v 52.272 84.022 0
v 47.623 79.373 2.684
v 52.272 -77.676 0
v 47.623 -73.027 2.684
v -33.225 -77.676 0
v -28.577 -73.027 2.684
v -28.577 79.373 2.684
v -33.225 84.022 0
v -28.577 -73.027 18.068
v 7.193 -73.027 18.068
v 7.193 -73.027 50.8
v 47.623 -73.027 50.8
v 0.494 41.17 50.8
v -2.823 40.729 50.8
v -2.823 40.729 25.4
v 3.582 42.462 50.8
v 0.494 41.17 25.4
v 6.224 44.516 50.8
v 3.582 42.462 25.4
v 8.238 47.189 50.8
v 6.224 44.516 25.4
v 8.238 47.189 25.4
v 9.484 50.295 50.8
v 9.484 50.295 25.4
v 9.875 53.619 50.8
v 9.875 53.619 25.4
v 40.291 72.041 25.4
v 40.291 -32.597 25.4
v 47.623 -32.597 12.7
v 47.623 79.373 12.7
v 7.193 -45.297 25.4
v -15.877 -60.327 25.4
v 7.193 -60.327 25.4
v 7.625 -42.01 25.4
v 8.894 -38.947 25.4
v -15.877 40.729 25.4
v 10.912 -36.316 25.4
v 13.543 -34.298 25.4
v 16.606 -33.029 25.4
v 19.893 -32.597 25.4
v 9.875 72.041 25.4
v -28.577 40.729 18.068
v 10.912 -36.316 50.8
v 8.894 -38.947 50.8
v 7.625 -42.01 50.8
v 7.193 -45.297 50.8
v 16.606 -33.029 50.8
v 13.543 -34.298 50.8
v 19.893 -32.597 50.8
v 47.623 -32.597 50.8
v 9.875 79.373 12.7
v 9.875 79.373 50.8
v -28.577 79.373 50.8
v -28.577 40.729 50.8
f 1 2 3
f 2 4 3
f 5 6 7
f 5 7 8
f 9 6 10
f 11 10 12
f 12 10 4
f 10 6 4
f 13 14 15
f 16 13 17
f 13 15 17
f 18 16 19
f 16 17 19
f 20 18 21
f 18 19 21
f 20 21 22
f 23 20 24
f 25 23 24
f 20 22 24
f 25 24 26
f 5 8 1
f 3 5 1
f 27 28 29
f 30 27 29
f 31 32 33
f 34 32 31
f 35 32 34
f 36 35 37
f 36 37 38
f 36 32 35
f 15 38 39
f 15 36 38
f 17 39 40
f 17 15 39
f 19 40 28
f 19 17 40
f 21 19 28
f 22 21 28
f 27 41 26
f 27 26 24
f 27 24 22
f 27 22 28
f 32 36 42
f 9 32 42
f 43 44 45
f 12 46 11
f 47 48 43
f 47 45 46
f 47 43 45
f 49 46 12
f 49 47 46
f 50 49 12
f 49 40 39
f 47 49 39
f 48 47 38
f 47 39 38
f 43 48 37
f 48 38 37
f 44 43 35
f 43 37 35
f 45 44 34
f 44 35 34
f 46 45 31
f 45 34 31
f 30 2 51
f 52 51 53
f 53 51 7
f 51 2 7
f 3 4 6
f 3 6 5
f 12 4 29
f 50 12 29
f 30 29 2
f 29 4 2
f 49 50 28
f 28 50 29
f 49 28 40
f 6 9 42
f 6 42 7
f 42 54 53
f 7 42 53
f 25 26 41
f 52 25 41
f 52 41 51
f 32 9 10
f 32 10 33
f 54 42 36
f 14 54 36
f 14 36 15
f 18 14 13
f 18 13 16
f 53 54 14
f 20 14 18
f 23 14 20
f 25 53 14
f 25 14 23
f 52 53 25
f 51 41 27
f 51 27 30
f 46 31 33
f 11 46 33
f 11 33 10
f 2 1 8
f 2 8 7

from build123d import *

# Parameters (mm, degrees)
F0_W          = 88.9
F0_H          = 165.1
F1_DEPTH      = 6.35
F2_DEPTH      = 25.4
F3_DEPTH      = 25.4
F4_T1_DEPTH   = 141.911978168
F4_T3_DEPTH   = 218.111978168
F4_T8_DEPTH   = 154.611978168
F4_T14_DEPTH  = 154.611978168
F4_T20_DEPTH  = 154.611978168
F4_T27_DEPTH  = 154.611978168
F4_T33_DEPTH  = 154.611978168
F4_T39_DEPTH  = 230.811978168
F4_T45_DEPTH  = 230.811978168
F4_T51_DEPTH  = 230.811978168
F4_T58_DEPTH  = 230.811978168
F4_T64_DEPTH  = 230.811978168
F4_T70_DEPTH  = 230.811978168
F4_T76_DEPTH  = 230.811978168
F4_T82_DEPTH  = 230.811978168
F4_T89_DEPTH  = 230.811978168
F4_T95_DEPTH  = 230.811978168
F4_T101_DEPTH = 154.611978168
F4_T107_DEPTH = 154.611978168
F4_T113_DEPTH = 154.611978168
F4_T120_DEPTH = 154.611978168
F4_T126_DEPTH = 154.611978168
F5_DEPTH      = 50.8


# Not quite as in the source:
# - a fillet or chamfer that OpenCascade refuses, or shapes differently, is made with other operations: its cross-section is extruded or revolved along the edge and cut away or added


with BuildPart() as f1:
    # F0 (on Top) → F1 (new body)
    with BuildSketch(Plane.XY):
        with Locations((9.5230986749, 3.1729897651)):
            Rectangle(F0_W, F0_H)
        Polygon((-28.5769013251, 40.7291018275), (-28.5769013251, 79.3729897651), (9.8754219143, 79.3729897651), (47.6230986749, 79.3729897651), (47.6230986749, -32.5965460718), (47.6230986749, -73.0270102349), (7.1926345117, -73.0270102349), (-28.5769013251, -73.0270102349), align=None, mode=Mode.SUBTRACT)
    extrude(amount=F1_DEPTH)

    # F0 (on Top) → F2 (join)
    with BuildSketch(Plane.XY):
        with BuildLine():
            Line((47.6230986749, 79.3729897651), (9.8754219143, 79.3729897651))
            Line((9.8754219143, 79.3729897651), (9.8754219143, 53.6192430722))
            ThreePointArc((9.8754219143, 53.6192430722), (6.2240768174, 44.5163243089), (-2.8231546322, 40.7291018275))
            Line((-2.8231546322, 40.7291018275), (-28.5769013251, 40.7291018275))
            Line((-28.5769013251, 40.7291018275), (-28.5769013251, -73.0270102349))
            Line((-28.5769013251, -73.0270102349), (7.1926345117, -73.0270102349))
            Line((7.1926345117, -73.0270102349), (7.1926345117, -45.2965460718))
            ThreePointArc((7.1926345117, -45.2965460718), (10.9123783907, -36.3162899507), (19.8926345117, -32.5965460718))
            Line((19.8926345117, -32.5965460718), (47.6230986749, -32.5965460718))
            Line((47.6230986749, -32.5965460718), (47.6230986749, 79.3729897651))
        make_face()
    extrude(amount=F2_DEPTH)

    # F0 (on Top) → F3 (join)
    with BuildSketch(Plane.XY):
        with BuildLine():
            Line((9.8754219143, 79.3729897651), (-28.5769013251, 79.3729897651))
            Line((-28.5769013251, 79.3729897651), (-28.5769013251, 40.7291018275))
            Line((-28.5769013251, 40.7291018275), (-2.8231546322, 40.7291018275))
            ThreePointArc((-2.8231546322, 40.7291018275), (6.2240768174, 44.5163243089), (9.8754219143, 53.6192430722))
            Line((9.8754219143, 53.6192430722), (9.8754219143, 79.3729897651))
        make_face()
        with BuildLine():
            Line((47.6230986749, -73.0270102349), (47.6230986749, -32.5965460718))
            Line((47.6230986749, -32.5965460718), (19.8926345117, -32.5965460718))
            ThreePointArc((19.8926345117, -32.5965460718), (10.9123783907, -36.3162899507), (7.1926345117, -45.2965460718))
            Line((7.1926345117, -45.2965460718), (7.1926345117, -73.0270102349))
            Line((7.1926345117, -73.0270102349), (47.6230986749, -73.0270102349))
        make_face()
    extrude(amount=F3_DEPTH)

    # F4: chamfer of 12.7 x 7.3323484187 on 8 edges, made by hand

    # F4_s2 → F4_t1 (cut)
    with BuildSketch(Plane.YZ.offset(-61.4328904091)):
        Polygon((-73.0270102349, 18.0676515813), (-60.3270102349, 25.4), (-73.0270102349, 25.4), align=None)
        Polygon((72.0406413464, 25.4), (79.3729897651, 12.7), (79.3729897651, 25.4), align=None)
    extrude(amount=F4_T1_DEPTH, mode=Mode.SUBTRACT)

    # F4_s4 → F4_t3 (cut)
    with BuildSketch(Plane.XZ.offset(-112.2289788491)):
        Polygon((-15.8769013251, 25.4), (-28.5769013251, 18.0676515813), (-28.5769013251, 25.4), align=None)
        Polygon((40.2907502562, 25.4), (47.6230986749, 12.7), (47.6230986749, 25.4), align=None)
    extrude(amount=F4_T3_DEPTH, mode=Mode.SUBTRACT)


with BuildPart() as f4_tool6:
    # F4_s7 → F4_t8 (new body)
    with BuildSketch(Plane.YZ.offset(-67.7828904091)):
        Polygon((-66.6770102349, 6.35), (-79.3770102349, -0.9823484187), (-79.3770102349, 6.35), align=None)
    extrude(amount=F4_T8_DEPTH)

    split(bisect_by=Plane.YZ.offset(-28.5769013251), keep=Keep.BOTTOM)

    split(bisect_by=Plane.XZ.offset(73.0270102349), keep=Keep.BOTTOM)


with BuildPart() as f1_1:
    add(f1.part)

    # F4_t5: cut F4_tool6
    add(f4_tool6.part, mode=Mode.SUBTRACT)


with BuildPart() as f4_tool12:
    # F4_s13 → F4_t14 (new body)
    with BuildSketch(Plane.YZ.offset(-67.7828904091)):
        Polygon((-66.6770102349, 6.35), (-79.3770102349, -0.9823484187), (-79.3770102349, 6.35), align=None)
    extrude(amount=F4_T14_DEPTH)

    split(bisect_by=Plane.YZ.offset(-28.5769013251), keep=Keep.BOTTOM)

    split(bisect_by=Plane.XZ.offset(73.0270102349), keep=Keep.TOP)


with BuildPart() as f1_2:
    add(f1_1.part)

    # F4_t11: cut F4_tool12
    add(f4_tool12.part, mode=Mode.SUBTRACT)


with BuildPart() as f4_tool18:
    # F4_s19 → F4_t20 (new body)
    with BuildSketch(Plane.YZ.offset(-67.7828904091)):
        Polygon((-66.6770102349, 6.35), (-79.3770102349, -0.9823484187), (-79.3770102349, 6.35), align=None)
    extrude(amount=F4_T20_DEPTH)

    split(bisect_by=Plane.YZ.offset(-28.5769013251), keep=Keep.TOP)

    split(bisect_by=Plane.YZ.offset(47.6230986749), keep=Keep.BOTTOM)

    split(bisect_by=Plane.XZ.offset(73.0270102349), keep=Keep.TOP)


with BuildPart() as f1_3:
    add(f1_2.part)

    # F4_t17: cut F4_tool18
    add(f4_tool18.part, mode=Mode.SUBTRACT)


with BuildPart() as f4_tool25:
    # F4_s26 → F4_t27 (new body)
    with BuildSketch(Plane.YZ.offset(-67.7828904091)):
        Polygon((-66.6770102349, 6.35), (-79.3770102349, -0.9823484187), (-79.3770102349, 6.35), align=None)
    extrude(amount=F4_T27_DEPTH)

    split(bisect_by=Plane.YZ.offset(47.6230986749), keep=Keep.TOP)

    split(bisect_by=Plane.XZ.offset(73.0270102349), keep=Keep.BOTTOM)


with BuildPart() as f1_4:
    add(f1_3.part)

    # F4_t24: cut F4_tool25
    add(f4_tool25.part, mode=Mode.SUBTRACT)


with BuildPart() as f4_tool31:
    # F4_s32 → F4_t33 (new body)
    with BuildSketch(Plane.YZ.offset(-67.7828904091)):
        Polygon((-66.6770102349, 6.35), (-79.3770102349, -0.9823484187), (-79.3770102349, 6.35), align=None)
    extrude(amount=F4_T33_DEPTH)

    split(bisect_by=Plane.YZ.offset(47.6230986749), keep=Keep.TOP)

    split(bisect_by=Plane.XZ.offset(73.0270102349), keep=Keep.TOP)


with BuildPart() as f1_5:
    add(f1_4.part)

    # F4_t30: cut F4_tool31
    add(f4_tool31.part, mode=Mode.SUBTRACT)


with BuildPart() as f4_tool37:
    # F4_s38 → F4_t39 (new body)
    with BuildSketch(Plane.XZ.offset(112.2329993189)):
        Polygon((41.2730986749, 6.35), (53.9730986749, -0.9823484187), (53.9730986749, 6.35), align=None)
    extrude(amount=-F4_T39_DEPTH)

    split(bisect_by=Plane.YZ.offset(47.6230986749), keep=Keep.BOTTOM)

    split(bisect_by=Plane.XZ.offset(73.0270102349), keep=Keep.TOP)


with BuildPart() as f1_6:
    add(f1_5.part)

    # F4_t36: cut F4_tool37
    add(f4_tool37.part, mode=Mode.SUBTRACT)


with BuildPart() as f4_tool43:
    # F4_s44 → F4_t45 (new body)
    with BuildSketch(Plane.XZ.offset(112.2329993189)):
        Polygon((41.2730986749, 6.35), (53.9730986749, -0.9823484187), (53.9730986749, 6.35), align=None)
    extrude(amount=-F4_T45_DEPTH)

    split(bisect_by=Plane.YZ.offset(47.6230986749), keep=Keep.TOP)

    split(bisect_by=Plane.XZ.offset(73.0270102349), keep=Keep.TOP)


with BuildPart() as f1_7:
    add(f1_6.part)

    # F4_t42: cut F4_tool43
    add(f4_tool43.part, mode=Mode.SUBTRACT)


with BuildPart() as f4_tool49:
    # F4_s50 → F4_t51 (new body)
    with BuildSketch(Plane.XZ.offset(112.2329993189)):
        Polygon((41.2730986749, 6.35), (53.9730986749, -0.9823484187), (53.9730986749, 6.35), align=None)
    extrude(amount=-F4_T51_DEPTH)

    split(bisect_by=Plane.XZ.offset(-79.3729897651), keep=Keep.TOP)

    split(bisect_by=Plane.YZ.offset(47.6230986749), keep=Keep.TOP)

    split(bisect_by=Plane.XZ.offset(73.0270102349), keep=Keep.BOTTOM)


with BuildPart() as f1_8:
    add(f1_7.part)

    # F4_t48: cut F4_tool49
    add(f4_tool49.part, mode=Mode.SUBTRACT)


with BuildPart() as f4_tool56:
    # F4_s57 → F4_t58 (new body)
    with BuildSketch(Plane.XZ.offset(112.2329993189)):
        Polygon((41.2730986749, 6.35), (53.9730986749, -0.9823484187), (53.9730986749, 6.35), align=None)
    extrude(amount=-F4_T58_DEPTH)

    split(bisect_by=Plane.XZ.offset(-79.3729897651), keep=Keep.BOTTOM)

    split(bisect_by=Plane.YZ.offset(47.6230986749), keep=Keep.BOTTOM)


with BuildPart() as f1_9:
    add(f1_8.part)

    # F4_t55: cut F4_tool56
    add(f4_tool56.part, mode=Mode.SUBTRACT)


with BuildPart() as f4_tool62:
    # F4_s63 → F4_t64 (new body)
    with BuildSketch(Plane.XZ.offset(112.2329993189)):
        Polygon((41.2730986749, 6.35), (53.9730986749, -0.9823484187), (53.9730986749, 6.35), align=None)
    extrude(amount=-F4_T64_DEPTH)

    split(bisect_by=Plane.XZ.offset(-79.3729897651), keep=Keep.BOTTOM)

    split(bisect_by=Plane.YZ.offset(47.6230986749), keep=Keep.TOP)


with BuildPart() as f1_10:
    add(f1_9.part)

    # F4_t61: cut F4_tool62
    add(f4_tool62.part, mode=Mode.SUBTRACT)


with BuildPart() as f4_tool68:
    # F4_s69 → F4_t70 (new body)
    with BuildSketch(Plane.XZ.offset(-118.5789788491)):
        Polygon((-22.2269013251, 6.35), (-34.9269013251, -0.9823484187), (-34.9269013251, 6.35), align=None)
    extrude(amount=F4_T70_DEPTH)

    split(bisect_by=Plane.YZ.offset(-28.5769013251), keep=Keep.TOP)

    split(bisect_by=Plane.XZ.offset(-79.3729897651), keep=Keep.BOTTOM)


with BuildPart() as f1_11:
    add(f1_10.part)

    # F4_t67: cut F4_tool68
    add(f4_tool68.part, mode=Mode.SUBTRACT)


with BuildPart() as f4_tool74:
    # F4_s75 → F4_t76 (new body)
    with BuildSketch(Plane.XZ.offset(-118.5789788491)):
        Polygon((-22.2269013251, 6.35), (-34.9269013251, -0.9823484187), (-34.9269013251, 6.35), align=None)
    extrude(amount=F4_T76_DEPTH)

    split(bisect_by=Plane.YZ.offset(-28.5769013251), keep=Keep.BOTTOM)

    split(bisect_by=Plane.XZ.offset(-79.3729897651), keep=Keep.BOTTOM)


with BuildPart() as f1_12:
    add(f1_11.part)

    # F4_t73: cut F4_tool74
    add(f4_tool74.part, mode=Mode.SUBTRACT)


with BuildPart() as f4_tool80:
    # F4_s81 → F4_t82 (new body)
    with BuildSketch(Plane.XZ.offset(-118.5789788491)):
        Polygon((-22.2269013251, 6.35), (-34.9269013251, -0.9823484187), (-34.9269013251, 6.35), align=None)
    extrude(amount=F4_T82_DEPTH)

    split(bisect_by=Plane.YZ.offset(-28.5769013251), keep=Keep.BOTTOM)

    split(bisect_by=Plane.XZ.offset(-79.3729897651), keep=Keep.TOP)

    split(bisect_by=Plane.XZ.offset(73.0270102349), keep=Keep.BOTTOM)


with BuildPart() as f1_13:
    add(f1_12.part)

    # F4_t79: cut F4_tool80
    add(f4_tool80.part, mode=Mode.SUBTRACT)


with BuildPart() as f4_tool87:
    # F4_s88 → F4_t89 (new body)
    with BuildSketch(Plane.XZ.offset(-118.5789788491)):
        Polygon((-22.2269013251, 6.35), (-34.9269013251, -0.9823484187), (-34.9269013251, 6.35), align=None)
    extrude(amount=F4_T89_DEPTH)

    split(bisect_by=Plane.YZ.offset(-28.5769013251), keep=Keep.TOP)

    split(bisect_by=Plane.XZ.offset(73.0270102349), keep=Keep.TOP)


with BuildPart() as f1_14:
    add(f1_13.part)

    # F4_t86: cut F4_tool87
    add(f4_tool87.part, mode=Mode.SUBTRACT)


with BuildPart() as f4_tool93:
    # F4_s94 → F4_t95 (new body)
    with BuildSketch(Plane.XZ.offset(-118.5789788491)):
        Polygon((-22.2269013251, 6.35), (-34.9269013251, -0.9823484187), (-34.9269013251, 6.35), align=None)
    extrude(amount=F4_T95_DEPTH)

    split(bisect_by=Plane.YZ.offset(-28.5769013251), keep=Keep.BOTTOM)

    split(bisect_by=Plane.XZ.offset(73.0270102349), keep=Keep.TOP)


with BuildPart() as f1_15:
    add(f1_14.part)

    # F4_t92: cut F4_tool93
    add(f4_tool93.part, mode=Mode.SUBTRACT)


with BuildPart() as f4_tool99:
    # F4_s100 → F4_t101 (new body)
    with BuildSketch(Plane.YZ.offset(86.8290877589)):
        Polygon((85.7229897651, -0.9823484187), (73.0229897651, 6.35), (85.7229897651, 6.35), align=None)
    extrude(amount=-F4_T101_DEPTH)

    split(bisect_by=Plane.XZ.offset(-79.3729897651), keep=Keep.BOTTOM)

    split(bisect_by=Plane.YZ.offset(47.6230986749), keep=Keep.TOP)


with BuildPart() as f1_16:
    add(f1_15.part)

    # F4_t98: cut F4_tool99
    add(f4_tool99.part, mode=Mode.SUBTRACT)


with BuildPart() as f4_tool105:
    # F4_s106 → F4_t107 (new body)
    with BuildSketch(Plane.YZ.offset(86.8290877589)):
        Polygon((85.7229897651, -0.9823484187), (73.0229897651, 6.35), (85.7229897651, 6.35), align=None)
    extrude(amount=-F4_T107_DEPTH)

    split(bisect_by=Plane.XZ.offset(-79.3729897651), keep=Keep.TOP)

    split(bisect_by=Plane.YZ.offset(47.6230986749), keep=Keep.TOP)


with BuildPart() as f1_17:
    add(f1_16.part)

    # F4_t104: cut F4_tool105
    add(f4_tool105.part, mode=Mode.SUBTRACT)


with BuildPart() as f4_tool111:
    # F4_s112 → F4_t113 (new body)
    with BuildSketch(Plane.YZ.offset(86.8290877589)):
        Polygon((85.7229897651, -0.9823484187), (73.0229897651, 6.35), (85.7229897651, 6.35), align=None)
    extrude(amount=-F4_T113_DEPTH)

    split(bisect_by=Plane.YZ.offset(-28.5769013251), keep=Keep.TOP)

    split(bisect_by=Plane.XZ.offset(-79.3729897651), keep=Keep.BOTTOM)

    split(bisect_by=Plane.YZ.offset(47.6230986749), keep=Keep.BOTTOM)


with BuildPart() as f1_18:
    add(f1_17.part)

    # F4_t110: cut F4_tool111
    add(f4_tool111.part, mode=Mode.SUBTRACT)


with BuildPart() as f4_tool118:
    # F4_s119 → F4_t120 (new body)
    with BuildSketch(Plane.YZ.offset(86.8290877589)):
        Polygon((85.7229897651, -0.9823484187), (73.0229897651, 6.35), (85.7229897651, 6.35), align=None)
    extrude(amount=-F4_T120_DEPTH)

    split(bisect_by=Plane.YZ.offset(-28.5769013251), keep=Keep.BOTTOM)

    split(bisect_by=Plane.XZ.offset(-79.3729897651), keep=Keep.BOTTOM)


with BuildPart() as f1_19:
    add(f1_18.part)

    # F4_t117: cut F4_tool118
    add(f4_tool118.part, mode=Mode.SUBTRACT)


with BuildPart() as f4_tool124:
    # F4_s125 → F4_t126 (new body)
    with BuildSketch(Plane.YZ.offset(86.8290877589)):
        Polygon((85.7229897651, -0.9823484187), (73.0229897651, 6.35), (85.7229897651, 6.35), align=None)
    extrude(amount=-F4_T126_DEPTH)

    split(bisect_by=Plane.YZ.offset(-28.5769013251), keep=Keep.BOTTOM)

    split(bisect_by=Plane.XZ.offset(-79.3729897651), keep=Keep.TOP)


with BuildPart() as f1_20:
    add(f1_19.part)

    # F4_t123: cut F4_tool124
    add(f4_tool124.part, mode=Mode.SUBTRACT)

    # F0 (on Top) → F5 (join)
    with BuildSketch(Plane.XY):
        with BuildLine():
            Line((47.6230986749, -73.0270102349), (47.6230986749, -32.5965460718))
            Line((47.6230986749, -32.5965460718), (19.8926345117, -32.5965460718))
            ThreePointArc((19.8926345117, -32.5965460718), (10.9123783907, -36.3162899507), (7.1926345117, -45.2965460718))
            Line((7.1926345117, -45.2965460718), (7.1926345117, -73.0270102349))
            Line((7.1926345117, -73.0270102349), (47.6230986749, -73.0270102349))
        make_face()
        with BuildLine():
            Line((9.8754219143, 79.3729897651), (-28.5769013251, 79.3729897651))
            Line((-28.5769013251, 79.3729897651), (-28.5769013251, 40.7291018275))
            Line((-28.5769013251, 40.7291018275), (-2.8231546322, 40.7291018275))
            ThreePointArc((-2.8231546322, 40.7291018275), (6.2240768174, 44.5163243089), (9.8754219143, 53.6192430722))
            Line((9.8754219143, 53.6192430722), (9.8754219143, 79.3729897651))
        make_face()
    extrude(amount=F5_DEPTH)


solid = f1_20.part
